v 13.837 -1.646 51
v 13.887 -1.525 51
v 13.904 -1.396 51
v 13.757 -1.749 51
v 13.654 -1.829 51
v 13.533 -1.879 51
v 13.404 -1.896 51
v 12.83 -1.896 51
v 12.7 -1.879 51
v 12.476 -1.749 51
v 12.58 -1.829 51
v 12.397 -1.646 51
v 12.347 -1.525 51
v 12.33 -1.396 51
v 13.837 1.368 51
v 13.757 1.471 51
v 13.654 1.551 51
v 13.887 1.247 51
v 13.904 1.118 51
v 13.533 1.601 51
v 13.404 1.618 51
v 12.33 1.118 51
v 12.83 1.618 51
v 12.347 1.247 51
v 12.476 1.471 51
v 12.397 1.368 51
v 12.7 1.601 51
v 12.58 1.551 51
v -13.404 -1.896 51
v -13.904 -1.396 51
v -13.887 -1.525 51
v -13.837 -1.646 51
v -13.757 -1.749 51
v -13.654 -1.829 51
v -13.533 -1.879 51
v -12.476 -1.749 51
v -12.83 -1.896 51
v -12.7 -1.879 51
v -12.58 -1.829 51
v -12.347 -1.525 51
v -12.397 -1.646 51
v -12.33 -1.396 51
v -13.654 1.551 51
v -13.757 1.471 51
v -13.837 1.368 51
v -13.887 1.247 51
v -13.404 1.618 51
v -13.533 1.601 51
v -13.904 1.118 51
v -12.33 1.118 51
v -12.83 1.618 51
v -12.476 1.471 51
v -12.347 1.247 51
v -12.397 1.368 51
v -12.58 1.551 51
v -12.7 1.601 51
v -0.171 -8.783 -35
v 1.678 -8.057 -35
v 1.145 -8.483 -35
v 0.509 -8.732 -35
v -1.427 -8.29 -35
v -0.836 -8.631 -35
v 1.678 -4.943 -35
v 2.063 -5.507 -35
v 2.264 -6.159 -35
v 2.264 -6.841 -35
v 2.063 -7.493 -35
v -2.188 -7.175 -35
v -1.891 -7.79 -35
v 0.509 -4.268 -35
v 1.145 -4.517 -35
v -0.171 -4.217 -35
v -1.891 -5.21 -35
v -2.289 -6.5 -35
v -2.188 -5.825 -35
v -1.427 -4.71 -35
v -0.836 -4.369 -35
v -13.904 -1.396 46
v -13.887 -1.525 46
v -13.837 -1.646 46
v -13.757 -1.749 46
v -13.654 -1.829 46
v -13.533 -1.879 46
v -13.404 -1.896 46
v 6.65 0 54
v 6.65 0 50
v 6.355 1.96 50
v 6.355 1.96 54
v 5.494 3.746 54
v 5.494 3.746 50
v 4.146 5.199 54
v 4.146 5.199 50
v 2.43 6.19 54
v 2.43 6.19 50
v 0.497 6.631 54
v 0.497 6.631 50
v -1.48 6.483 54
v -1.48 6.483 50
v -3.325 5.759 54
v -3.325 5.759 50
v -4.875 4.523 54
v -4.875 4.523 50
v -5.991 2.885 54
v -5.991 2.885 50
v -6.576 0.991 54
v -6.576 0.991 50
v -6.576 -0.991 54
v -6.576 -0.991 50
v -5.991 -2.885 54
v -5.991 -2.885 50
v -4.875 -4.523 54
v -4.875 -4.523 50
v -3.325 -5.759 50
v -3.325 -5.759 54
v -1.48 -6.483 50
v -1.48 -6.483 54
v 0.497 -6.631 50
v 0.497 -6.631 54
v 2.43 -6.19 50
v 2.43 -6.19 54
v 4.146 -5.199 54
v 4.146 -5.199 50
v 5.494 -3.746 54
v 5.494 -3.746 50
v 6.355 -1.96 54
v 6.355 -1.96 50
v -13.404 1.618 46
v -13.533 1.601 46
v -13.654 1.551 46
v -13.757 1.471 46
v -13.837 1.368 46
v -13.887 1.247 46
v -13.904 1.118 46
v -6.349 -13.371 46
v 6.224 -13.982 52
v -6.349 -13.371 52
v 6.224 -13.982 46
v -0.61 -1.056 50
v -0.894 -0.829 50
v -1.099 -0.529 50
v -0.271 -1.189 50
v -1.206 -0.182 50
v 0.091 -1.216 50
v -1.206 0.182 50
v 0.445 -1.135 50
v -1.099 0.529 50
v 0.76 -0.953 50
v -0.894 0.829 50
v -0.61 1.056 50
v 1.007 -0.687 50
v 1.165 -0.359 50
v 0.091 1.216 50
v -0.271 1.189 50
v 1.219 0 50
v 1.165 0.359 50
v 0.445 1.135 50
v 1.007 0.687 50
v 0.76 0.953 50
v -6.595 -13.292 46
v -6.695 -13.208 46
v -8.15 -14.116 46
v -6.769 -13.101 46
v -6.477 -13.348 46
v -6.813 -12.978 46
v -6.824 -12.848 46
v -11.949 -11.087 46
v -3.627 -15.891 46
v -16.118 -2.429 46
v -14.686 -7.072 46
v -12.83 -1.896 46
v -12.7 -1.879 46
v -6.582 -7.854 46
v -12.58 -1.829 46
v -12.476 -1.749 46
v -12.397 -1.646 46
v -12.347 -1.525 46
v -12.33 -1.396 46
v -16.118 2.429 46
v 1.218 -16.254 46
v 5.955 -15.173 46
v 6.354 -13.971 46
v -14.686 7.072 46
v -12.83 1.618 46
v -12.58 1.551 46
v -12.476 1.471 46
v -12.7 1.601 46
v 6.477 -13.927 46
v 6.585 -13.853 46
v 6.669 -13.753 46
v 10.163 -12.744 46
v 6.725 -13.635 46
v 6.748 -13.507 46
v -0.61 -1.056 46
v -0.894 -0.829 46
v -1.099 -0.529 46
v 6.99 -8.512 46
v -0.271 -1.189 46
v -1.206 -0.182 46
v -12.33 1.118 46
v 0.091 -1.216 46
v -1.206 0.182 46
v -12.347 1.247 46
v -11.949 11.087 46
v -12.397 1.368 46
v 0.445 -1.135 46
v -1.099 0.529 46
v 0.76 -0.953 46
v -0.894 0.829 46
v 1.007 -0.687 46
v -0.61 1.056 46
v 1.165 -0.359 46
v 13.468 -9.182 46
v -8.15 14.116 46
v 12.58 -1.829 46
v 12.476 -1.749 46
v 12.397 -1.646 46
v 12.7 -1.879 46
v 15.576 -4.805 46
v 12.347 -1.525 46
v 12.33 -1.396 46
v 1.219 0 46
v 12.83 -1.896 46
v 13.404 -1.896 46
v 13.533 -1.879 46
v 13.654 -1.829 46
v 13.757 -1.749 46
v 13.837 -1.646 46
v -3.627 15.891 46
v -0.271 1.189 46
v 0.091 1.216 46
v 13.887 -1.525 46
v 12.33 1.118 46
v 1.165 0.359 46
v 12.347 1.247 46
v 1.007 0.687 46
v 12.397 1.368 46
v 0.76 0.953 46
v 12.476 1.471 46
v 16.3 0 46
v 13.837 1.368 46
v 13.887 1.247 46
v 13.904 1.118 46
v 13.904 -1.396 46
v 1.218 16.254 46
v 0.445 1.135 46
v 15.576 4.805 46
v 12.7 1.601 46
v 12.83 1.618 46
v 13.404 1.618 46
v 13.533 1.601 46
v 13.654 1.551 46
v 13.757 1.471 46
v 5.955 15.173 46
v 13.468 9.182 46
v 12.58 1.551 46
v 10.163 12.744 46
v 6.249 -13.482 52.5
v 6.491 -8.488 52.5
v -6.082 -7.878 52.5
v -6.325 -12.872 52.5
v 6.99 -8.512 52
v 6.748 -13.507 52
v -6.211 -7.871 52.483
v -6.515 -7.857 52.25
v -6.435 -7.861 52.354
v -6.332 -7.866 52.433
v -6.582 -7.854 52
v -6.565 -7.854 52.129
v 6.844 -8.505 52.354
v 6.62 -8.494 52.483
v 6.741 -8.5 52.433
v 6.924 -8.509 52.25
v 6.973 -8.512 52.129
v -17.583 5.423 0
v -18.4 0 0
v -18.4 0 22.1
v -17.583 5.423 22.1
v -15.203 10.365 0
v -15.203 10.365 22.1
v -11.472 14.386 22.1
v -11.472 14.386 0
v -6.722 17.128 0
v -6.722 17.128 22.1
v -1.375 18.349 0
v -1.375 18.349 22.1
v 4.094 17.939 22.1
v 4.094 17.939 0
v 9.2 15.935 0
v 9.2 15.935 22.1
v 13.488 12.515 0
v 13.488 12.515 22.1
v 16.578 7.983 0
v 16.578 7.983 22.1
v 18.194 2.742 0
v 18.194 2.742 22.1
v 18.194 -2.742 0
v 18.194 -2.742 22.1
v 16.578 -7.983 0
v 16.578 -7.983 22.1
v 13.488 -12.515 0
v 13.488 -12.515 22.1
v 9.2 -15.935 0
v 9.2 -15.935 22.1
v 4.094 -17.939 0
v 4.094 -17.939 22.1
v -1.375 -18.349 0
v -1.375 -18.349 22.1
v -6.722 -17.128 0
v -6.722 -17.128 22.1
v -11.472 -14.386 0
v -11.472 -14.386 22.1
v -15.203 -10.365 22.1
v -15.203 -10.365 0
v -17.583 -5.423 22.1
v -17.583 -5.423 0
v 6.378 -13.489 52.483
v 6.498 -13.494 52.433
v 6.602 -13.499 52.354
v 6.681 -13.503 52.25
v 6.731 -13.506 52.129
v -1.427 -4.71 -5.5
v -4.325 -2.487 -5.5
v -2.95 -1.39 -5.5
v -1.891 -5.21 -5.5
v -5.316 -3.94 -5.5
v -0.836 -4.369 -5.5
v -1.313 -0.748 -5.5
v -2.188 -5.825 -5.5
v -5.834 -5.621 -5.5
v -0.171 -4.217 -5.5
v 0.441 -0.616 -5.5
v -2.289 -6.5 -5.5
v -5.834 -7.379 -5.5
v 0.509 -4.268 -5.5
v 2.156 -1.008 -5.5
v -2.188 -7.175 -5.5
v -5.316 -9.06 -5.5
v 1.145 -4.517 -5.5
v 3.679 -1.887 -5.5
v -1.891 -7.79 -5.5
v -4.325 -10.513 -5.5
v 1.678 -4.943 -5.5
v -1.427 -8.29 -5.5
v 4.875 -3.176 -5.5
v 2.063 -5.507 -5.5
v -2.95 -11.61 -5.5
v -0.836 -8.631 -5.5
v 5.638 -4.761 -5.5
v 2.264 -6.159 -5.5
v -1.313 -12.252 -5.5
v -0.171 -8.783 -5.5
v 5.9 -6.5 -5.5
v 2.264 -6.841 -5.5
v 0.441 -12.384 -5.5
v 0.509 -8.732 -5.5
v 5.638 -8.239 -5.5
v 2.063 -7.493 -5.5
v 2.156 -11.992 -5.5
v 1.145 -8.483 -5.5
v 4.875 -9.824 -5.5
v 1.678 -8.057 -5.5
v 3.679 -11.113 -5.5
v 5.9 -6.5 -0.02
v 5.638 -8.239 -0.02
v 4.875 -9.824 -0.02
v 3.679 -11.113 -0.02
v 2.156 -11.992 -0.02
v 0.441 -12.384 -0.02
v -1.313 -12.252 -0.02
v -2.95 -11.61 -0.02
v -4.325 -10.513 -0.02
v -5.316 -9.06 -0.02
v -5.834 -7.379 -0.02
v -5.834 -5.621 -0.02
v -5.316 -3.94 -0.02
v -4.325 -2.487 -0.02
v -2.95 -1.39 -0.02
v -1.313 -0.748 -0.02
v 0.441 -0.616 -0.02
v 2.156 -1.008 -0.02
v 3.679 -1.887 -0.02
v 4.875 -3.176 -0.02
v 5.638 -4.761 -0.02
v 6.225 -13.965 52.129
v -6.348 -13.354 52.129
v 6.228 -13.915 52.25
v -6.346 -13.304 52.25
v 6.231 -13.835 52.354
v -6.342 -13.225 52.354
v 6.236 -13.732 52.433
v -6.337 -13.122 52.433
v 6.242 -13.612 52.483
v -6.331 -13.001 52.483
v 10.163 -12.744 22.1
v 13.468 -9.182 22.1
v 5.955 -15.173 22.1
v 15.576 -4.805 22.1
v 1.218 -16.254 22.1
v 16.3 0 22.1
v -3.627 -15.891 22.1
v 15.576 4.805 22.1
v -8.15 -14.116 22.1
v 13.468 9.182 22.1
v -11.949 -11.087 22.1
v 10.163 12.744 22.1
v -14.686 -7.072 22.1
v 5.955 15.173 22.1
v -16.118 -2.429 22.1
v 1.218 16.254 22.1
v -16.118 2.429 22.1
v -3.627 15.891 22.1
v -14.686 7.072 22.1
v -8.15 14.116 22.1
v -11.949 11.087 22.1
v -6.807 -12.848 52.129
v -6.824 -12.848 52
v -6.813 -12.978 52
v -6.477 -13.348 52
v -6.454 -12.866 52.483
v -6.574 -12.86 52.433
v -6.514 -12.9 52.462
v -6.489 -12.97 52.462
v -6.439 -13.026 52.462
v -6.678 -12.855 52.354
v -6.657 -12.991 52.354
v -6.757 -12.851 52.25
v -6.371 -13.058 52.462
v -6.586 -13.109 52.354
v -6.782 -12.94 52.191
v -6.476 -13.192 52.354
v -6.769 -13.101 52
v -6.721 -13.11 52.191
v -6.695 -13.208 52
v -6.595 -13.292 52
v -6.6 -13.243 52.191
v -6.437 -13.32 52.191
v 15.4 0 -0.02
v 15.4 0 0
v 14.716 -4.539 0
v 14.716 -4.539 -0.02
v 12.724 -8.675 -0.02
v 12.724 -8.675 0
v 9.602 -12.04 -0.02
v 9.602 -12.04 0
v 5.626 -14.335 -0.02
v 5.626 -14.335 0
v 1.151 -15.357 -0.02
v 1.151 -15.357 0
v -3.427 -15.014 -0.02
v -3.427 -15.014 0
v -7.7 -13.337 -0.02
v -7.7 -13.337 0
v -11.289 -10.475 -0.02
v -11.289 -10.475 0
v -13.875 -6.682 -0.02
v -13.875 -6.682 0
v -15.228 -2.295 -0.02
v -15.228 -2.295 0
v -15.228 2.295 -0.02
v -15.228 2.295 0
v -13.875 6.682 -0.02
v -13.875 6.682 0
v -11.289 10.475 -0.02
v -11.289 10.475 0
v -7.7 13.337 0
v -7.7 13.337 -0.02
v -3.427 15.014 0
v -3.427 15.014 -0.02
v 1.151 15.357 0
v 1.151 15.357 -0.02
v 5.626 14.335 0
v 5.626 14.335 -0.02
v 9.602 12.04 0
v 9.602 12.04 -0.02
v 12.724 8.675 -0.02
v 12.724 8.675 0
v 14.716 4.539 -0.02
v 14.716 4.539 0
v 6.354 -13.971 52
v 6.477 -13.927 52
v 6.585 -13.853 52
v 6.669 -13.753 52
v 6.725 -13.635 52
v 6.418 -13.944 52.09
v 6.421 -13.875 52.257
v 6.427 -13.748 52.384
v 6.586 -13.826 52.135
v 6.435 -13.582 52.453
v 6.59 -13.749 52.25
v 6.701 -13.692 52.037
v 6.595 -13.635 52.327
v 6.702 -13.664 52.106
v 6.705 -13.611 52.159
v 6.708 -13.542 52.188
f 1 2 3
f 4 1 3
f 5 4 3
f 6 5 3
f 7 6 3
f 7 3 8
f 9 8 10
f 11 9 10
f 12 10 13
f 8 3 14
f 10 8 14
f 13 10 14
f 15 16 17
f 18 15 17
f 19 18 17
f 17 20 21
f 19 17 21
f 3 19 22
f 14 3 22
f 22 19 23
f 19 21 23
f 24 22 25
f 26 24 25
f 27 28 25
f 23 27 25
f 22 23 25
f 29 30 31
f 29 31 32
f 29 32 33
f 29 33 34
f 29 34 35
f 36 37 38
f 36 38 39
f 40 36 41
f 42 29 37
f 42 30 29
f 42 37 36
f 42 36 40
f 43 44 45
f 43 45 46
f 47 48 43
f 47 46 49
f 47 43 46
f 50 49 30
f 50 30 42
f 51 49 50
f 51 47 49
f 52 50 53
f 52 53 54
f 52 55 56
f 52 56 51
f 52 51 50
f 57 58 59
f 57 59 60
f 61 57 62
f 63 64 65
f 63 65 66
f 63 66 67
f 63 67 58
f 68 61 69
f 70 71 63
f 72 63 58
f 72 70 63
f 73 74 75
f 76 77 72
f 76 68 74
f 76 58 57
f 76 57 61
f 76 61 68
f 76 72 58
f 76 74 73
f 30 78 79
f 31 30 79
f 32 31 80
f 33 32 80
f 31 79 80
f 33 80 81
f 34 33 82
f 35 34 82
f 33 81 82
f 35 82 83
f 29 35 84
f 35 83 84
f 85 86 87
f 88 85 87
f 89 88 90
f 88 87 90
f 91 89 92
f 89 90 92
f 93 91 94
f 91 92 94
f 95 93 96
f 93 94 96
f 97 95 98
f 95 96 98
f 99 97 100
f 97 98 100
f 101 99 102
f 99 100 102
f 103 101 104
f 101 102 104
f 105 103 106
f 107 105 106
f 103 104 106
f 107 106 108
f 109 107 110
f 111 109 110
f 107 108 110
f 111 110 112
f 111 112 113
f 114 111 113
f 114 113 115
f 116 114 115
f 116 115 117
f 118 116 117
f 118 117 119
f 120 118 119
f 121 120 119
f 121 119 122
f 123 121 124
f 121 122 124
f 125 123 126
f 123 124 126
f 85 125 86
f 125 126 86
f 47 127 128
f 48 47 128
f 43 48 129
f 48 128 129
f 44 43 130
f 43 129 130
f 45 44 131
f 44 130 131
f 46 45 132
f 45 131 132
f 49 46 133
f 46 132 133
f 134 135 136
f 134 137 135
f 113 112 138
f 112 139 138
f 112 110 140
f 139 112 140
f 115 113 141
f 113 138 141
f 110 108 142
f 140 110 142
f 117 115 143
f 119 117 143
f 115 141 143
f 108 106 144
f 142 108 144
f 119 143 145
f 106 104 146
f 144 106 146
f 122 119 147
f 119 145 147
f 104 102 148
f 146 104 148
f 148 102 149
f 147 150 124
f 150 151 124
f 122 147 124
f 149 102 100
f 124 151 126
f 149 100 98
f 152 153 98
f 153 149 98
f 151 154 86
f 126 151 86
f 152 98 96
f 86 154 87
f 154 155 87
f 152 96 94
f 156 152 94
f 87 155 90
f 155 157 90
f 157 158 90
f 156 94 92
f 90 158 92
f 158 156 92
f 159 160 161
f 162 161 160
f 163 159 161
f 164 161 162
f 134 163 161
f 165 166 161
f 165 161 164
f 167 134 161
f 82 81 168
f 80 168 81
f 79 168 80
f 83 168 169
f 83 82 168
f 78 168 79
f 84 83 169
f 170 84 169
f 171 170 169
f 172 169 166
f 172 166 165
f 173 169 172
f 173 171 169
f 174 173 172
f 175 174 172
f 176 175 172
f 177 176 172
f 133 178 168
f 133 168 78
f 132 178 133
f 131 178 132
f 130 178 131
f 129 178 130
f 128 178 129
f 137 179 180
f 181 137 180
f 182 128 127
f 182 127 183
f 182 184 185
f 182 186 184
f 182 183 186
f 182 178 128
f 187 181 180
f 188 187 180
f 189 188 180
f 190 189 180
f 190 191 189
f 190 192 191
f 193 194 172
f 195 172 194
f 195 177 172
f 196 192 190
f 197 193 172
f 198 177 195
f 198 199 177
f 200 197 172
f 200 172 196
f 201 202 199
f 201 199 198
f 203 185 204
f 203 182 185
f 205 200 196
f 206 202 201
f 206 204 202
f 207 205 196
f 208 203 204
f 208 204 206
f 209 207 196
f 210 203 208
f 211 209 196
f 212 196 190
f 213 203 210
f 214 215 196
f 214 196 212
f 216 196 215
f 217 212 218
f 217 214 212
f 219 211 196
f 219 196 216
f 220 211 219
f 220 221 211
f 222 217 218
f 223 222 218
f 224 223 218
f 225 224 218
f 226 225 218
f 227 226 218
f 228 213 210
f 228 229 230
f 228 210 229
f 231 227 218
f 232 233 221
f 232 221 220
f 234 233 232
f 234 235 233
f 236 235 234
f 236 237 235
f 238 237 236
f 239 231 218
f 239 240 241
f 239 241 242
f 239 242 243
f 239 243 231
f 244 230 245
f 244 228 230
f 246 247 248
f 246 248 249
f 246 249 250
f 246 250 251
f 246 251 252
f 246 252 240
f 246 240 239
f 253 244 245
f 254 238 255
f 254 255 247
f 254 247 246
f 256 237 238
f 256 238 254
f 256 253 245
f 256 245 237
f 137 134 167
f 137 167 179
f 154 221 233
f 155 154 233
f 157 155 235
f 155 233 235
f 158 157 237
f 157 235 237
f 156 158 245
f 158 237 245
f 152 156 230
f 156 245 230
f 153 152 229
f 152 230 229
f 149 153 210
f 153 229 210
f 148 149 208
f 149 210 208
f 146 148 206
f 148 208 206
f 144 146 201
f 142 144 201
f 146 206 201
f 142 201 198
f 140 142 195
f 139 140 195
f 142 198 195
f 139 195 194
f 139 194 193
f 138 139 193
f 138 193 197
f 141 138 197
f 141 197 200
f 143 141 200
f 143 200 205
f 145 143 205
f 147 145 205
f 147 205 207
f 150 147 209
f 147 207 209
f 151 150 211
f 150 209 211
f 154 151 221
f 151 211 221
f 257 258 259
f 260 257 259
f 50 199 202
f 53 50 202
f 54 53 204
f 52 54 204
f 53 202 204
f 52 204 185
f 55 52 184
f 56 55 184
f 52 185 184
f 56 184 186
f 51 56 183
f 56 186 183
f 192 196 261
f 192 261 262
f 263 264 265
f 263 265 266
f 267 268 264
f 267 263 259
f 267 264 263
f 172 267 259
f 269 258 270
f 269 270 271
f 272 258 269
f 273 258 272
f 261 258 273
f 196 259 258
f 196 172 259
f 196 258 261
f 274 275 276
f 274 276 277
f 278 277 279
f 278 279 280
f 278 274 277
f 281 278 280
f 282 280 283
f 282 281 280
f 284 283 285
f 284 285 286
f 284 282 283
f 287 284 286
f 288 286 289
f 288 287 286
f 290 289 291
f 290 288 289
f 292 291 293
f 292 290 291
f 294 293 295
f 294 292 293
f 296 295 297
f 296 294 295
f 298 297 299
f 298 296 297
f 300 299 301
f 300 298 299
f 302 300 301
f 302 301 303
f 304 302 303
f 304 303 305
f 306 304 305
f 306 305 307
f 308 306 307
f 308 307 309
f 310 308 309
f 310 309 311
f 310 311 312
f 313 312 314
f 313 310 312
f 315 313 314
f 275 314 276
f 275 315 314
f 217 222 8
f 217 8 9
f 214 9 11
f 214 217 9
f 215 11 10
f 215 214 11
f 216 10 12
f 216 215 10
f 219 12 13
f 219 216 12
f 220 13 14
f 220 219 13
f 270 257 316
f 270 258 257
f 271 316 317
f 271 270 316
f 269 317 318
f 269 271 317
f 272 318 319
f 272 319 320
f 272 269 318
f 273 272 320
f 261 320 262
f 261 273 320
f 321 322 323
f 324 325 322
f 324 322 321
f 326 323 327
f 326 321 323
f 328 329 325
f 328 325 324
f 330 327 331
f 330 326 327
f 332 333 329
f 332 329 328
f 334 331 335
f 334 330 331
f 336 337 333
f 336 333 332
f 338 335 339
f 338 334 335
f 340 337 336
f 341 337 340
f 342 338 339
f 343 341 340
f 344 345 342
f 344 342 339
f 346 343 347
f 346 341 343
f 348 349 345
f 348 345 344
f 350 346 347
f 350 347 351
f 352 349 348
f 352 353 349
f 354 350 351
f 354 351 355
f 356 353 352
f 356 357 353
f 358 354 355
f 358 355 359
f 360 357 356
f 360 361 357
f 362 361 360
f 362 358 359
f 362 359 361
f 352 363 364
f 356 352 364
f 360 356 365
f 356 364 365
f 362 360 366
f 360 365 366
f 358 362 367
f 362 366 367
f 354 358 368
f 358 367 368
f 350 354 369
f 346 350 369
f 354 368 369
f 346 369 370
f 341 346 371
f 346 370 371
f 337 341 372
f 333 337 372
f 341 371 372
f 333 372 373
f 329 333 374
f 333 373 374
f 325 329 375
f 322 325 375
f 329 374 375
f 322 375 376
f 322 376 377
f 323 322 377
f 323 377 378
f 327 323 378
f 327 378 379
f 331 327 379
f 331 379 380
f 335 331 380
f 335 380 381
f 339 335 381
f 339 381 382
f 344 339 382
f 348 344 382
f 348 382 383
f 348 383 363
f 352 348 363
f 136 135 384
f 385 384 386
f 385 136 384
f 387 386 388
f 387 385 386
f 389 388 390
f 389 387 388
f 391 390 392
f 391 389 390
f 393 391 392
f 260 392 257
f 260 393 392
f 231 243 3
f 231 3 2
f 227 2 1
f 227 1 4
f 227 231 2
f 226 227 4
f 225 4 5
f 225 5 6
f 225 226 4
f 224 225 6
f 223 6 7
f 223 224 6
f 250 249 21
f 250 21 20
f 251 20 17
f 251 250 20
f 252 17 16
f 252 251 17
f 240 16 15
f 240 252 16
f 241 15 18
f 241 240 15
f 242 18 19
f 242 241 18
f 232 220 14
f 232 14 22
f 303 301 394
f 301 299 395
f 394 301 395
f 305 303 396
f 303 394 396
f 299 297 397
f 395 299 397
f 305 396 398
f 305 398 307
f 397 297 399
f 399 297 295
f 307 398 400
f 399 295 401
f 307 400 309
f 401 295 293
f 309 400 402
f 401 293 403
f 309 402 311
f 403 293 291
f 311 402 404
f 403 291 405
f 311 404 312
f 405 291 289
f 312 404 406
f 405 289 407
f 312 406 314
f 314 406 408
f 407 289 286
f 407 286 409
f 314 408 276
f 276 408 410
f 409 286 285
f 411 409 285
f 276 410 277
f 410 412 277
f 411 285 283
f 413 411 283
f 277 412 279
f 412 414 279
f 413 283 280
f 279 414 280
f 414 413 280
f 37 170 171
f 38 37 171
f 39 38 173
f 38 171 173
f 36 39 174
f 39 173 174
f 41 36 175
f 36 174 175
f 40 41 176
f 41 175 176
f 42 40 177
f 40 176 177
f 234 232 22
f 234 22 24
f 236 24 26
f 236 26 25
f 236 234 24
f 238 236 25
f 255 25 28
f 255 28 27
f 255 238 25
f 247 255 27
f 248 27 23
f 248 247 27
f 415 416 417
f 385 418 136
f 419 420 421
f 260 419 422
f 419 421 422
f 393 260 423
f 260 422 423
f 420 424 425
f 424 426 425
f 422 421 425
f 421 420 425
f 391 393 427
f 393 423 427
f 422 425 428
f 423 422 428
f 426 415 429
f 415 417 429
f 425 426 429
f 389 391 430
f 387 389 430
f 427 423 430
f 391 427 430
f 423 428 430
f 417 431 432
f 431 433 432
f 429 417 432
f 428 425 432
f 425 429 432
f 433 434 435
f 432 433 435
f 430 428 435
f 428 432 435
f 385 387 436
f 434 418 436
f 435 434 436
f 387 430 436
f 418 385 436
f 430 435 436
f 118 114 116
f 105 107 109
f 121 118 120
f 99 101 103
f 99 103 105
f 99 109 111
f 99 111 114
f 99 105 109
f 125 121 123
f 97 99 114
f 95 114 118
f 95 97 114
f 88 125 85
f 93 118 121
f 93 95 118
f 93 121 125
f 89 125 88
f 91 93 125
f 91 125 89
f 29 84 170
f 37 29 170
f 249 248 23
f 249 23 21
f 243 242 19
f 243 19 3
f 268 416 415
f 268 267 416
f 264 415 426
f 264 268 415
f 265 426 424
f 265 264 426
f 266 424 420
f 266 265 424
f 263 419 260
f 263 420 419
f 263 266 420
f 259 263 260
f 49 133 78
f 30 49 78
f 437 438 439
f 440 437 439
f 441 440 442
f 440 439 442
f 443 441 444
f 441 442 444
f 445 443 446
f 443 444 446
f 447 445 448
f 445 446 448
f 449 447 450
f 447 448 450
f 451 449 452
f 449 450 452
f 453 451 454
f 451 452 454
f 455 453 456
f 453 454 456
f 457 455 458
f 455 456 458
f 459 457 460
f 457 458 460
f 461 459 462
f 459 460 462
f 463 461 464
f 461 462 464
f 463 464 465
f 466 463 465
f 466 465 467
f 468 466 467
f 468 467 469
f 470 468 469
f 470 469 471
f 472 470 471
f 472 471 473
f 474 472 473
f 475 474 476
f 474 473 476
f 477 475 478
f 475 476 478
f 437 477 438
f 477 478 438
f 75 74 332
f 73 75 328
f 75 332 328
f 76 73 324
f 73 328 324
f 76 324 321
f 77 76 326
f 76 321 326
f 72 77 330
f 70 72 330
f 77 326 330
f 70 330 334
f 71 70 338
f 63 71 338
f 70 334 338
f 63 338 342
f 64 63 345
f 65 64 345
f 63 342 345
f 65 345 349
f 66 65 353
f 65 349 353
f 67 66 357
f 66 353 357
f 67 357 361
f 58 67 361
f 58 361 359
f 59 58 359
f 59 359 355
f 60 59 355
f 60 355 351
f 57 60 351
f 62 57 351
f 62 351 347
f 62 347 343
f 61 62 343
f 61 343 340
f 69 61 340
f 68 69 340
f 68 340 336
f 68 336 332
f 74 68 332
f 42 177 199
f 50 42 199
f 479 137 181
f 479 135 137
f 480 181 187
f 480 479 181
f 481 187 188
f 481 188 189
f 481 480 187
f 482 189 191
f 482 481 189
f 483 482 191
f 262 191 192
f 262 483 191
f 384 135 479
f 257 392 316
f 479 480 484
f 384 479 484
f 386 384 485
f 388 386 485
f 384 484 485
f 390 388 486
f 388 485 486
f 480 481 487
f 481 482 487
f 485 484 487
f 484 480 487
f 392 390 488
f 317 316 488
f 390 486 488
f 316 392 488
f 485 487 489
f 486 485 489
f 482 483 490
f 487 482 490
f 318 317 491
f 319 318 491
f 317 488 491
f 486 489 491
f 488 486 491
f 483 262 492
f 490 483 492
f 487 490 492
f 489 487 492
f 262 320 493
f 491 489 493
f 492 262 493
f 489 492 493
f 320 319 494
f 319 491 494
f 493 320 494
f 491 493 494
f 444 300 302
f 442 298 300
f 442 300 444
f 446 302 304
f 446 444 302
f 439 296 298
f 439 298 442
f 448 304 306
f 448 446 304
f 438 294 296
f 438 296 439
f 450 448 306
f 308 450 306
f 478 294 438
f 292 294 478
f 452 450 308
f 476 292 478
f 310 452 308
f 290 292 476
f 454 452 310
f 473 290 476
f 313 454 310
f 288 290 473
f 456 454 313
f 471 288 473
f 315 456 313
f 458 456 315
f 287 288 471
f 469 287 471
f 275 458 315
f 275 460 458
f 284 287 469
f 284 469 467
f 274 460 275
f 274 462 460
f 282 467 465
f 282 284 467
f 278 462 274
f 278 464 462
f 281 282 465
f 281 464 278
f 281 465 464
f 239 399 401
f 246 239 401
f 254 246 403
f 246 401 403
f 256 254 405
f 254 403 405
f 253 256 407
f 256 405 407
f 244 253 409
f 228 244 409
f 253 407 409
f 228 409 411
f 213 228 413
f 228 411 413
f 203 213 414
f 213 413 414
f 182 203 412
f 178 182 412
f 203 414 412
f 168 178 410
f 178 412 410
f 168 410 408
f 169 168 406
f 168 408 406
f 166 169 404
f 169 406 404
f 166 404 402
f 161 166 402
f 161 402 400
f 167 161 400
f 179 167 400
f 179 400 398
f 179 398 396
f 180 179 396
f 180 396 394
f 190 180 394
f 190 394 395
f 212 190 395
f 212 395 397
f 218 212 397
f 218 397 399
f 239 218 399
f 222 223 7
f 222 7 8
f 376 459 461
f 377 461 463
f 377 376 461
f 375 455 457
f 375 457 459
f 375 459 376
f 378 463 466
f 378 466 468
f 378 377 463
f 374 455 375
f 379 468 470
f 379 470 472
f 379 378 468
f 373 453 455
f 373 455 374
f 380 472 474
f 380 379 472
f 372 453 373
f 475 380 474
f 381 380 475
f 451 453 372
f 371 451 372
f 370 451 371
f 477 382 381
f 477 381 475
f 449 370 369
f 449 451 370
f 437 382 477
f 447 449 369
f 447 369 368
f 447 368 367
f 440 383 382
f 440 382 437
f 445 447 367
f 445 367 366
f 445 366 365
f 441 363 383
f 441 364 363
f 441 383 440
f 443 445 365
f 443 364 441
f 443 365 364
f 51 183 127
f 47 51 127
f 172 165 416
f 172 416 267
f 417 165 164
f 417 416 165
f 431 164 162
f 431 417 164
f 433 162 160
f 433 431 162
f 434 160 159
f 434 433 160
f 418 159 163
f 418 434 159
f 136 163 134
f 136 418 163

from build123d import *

# Parameters (mm, degrees)
SKETCH1_R            = 16.3
BOSS_EXTRUDE1_DEPTH  = 46
SKETCH2_R            = 18.4
BOSS_EXTRUDE2_DEPTH  = 22.1
SKETCH3_R            = 5.9
SKETCH3_R_2          = 2.289263955330087
BOSS_EXTRUDE3_DEPTH  = 5.5
SKETCH4_R            = 2.289263955330087
BOSS_EXTRUDE4_DEPTH  = 35
SKETCH5_R            = 15.4
BOSS_EXTRUDE5_DEPTH  = 0.02
SKETCH7_R            = 1.219257325052135
BOSS_EXTRUDE6_DEPTH  = 4
SKETCH8_R            = 6.650000000000001
BOSS_EXTRUDE7_DEPTH  = 4
BOSS_EXTRUDE9_DEPTH  = 6.5
FILLET3_R            = 0.5
FILLET4_R            = 0.5
BOSS_EXTRUDE10_DEPTH = 5


with BuildPart() as part:
    # Sketch1 → Boss-Extrude1 (new body)
    with BuildSketch(Plane.XY):
        Circle(SKETCH1_R)
    extrude(amount=BOSS_EXTRUDE1_DEPTH)

    # Sketch2 → Boss-Extrude2 (add)
    with BuildSketch(Plane(origin=(0, 0, 0), x_dir=(-1, 0, 0), z_dir=(0, 0, -1))):
        Circle(SKETCH2_R)
    extrude(amount=-BOSS_EXTRUDE2_DEPTH)

    # Sketch3 → Boss-Extrude3 (add)
    with BuildSketch(Plane(origin=(0, 0, 0), x_dir=(-1, 0, 0), z_dir=(0, 0, -1))):
        with Locations(Location((3.05e-15, -6.499999999999999, 0), (0, 0, 180))):
            Circle(SKETCH3_R)
        with Locations((3.05e-15, -6.499999999999999)):
            Circle(SKETCH3_R_2, mode=Mode.SUBTRACT)
    extrude(amount=BOSS_EXTRUDE3_DEPTH)

    # Sketch4 → Boss-Extrude4 (add)
    with BuildSketch(Plane(origin=(0, 0, 0), x_dir=(-1, 0, 0), z_dir=(0, 0, -1))):
        with Locations((3.05e-15, -6.499999999999999)):
            Circle(SKETCH4_R)
    extrude(amount=BOSS_EXTRUDE4_DEPTH)

    # Sketch5 → Boss-Extrude5 (add)
    with BuildSketch(Plane(origin=(0, 0, 0), x_dir=(-1, 0, 0), z_dir=(0, 0, -1))):
        with Locations(Location((0, 0, 0), (0, 0, 180))):
            Circle(SKETCH5_R)
    extrude(amount=BOSS_EXTRUDE5_DEPTH)

    # Sketch7 → Boss-Extrude6 (add)
    with BuildSketch(Plane.XY.offset(46)):
        Circle(SKETCH7_R)
    extrude(amount=BOSS_EXTRUDE6_DEPTH)

    # Sketch8 → Boss-Extrude7 (add)
    with BuildSketch(Plane.XY.offset(50)):
        Circle(SKETCH8_R)
    extrude(amount=BOSS_EXTRUDE7_DEPTH)

    # Sketch9 → Boss-Extrude9 (add)
    with BuildSketch(Plane.XY.offset(46)):
        Polygon((6.723733828483781, -14.005985299746056), (-6.848294391516219, -13.347034241416539), (-6.581571792597097, -7.853505406939939), (6.990456427402904, -8.512456465269457), align=None)
    extrude(amount=BOSS_EXTRUDE9_DEPTH)

    # Fillet3
    fillet3_edges = [part.edges().sort_by_distance(p)[0] for p in [
        (-6.848294391516219, -13.347034241416539, 49.25),
        (-6.714933092056658, -10.60026982417824, 52.5),
        (-0.06228028151621867, -13.676509770581298, 52.5),
    ]]
    fillet(fillet3_edges, radius=FILLET3_R)

    # Fillet4
    fillet4_edges = [part.edges().sort_by_distance(p)[0] for p in [
        (6.723733828483781, -14.005985299746056, 49),
        (6.869218882439666, -11.009515026395185, 52.5),
        (6.730835759440846, -13.859710995839299, 52.35355339059328),
    ]]
    fillet(fillet4_edges, radius=FILLET4_R)

    # Sketch10 → Boss-Extrude10 (add)
    with BuildSketch(Plane.XY.offset(46)):
        with BuildLine():
            Line((-13.903663432832225, 1.1177381723245752), (-13.903663432832225, -1.3957121223426263))
            ThreePointArc((-13.903663432832225, -1.3957121223426263), (-13.757216823425498, -1.7492655129359036), (-13.403663432832222, -1.8957121223426299))
            Line((-13.403663432832222, -1.8957121223426299), (-12.829664566070878, -1.8957121223426299))
            ThreePointArc((-12.829664566070878, -1.8957121223426299), (-12.476111175477602, -1.7492655129359036), (-12.329664566070875, -1.3957121223426263))
            Line((-12.329664566070875, -1.3957121223426263), (-12.329664566070875, 1.1177381723245752))
            ThreePointArc((-12.329664566070875, 1.1177381723245752), (-12.476111175477602, 1.4712915629178525), (-12.829664566070878, 1.6177381723245787))
            Line((-12.829664566070878, 1.6177381723245787), (-13.403663432832222, 1.6177381723245787))
            ThreePointArc((-13.403663432832222, 1.6177381723245787), (-13.757216823425498, 1.4712915629178525), (-13.903663432832225, 1.1177381723245752))
        make_face()
        with BuildLine():
            Line((13.403663432832222, -1.8957121223426299), (12.829664566070878, -1.8957121223426299))
            ThreePointArc((12.829664566070878, -1.8957121223426299), (12.476111175477602, -1.7492655129359036), (12.329664566070875, -1.3957121223426263))
            Line((12.329664566070875, -1.3957121223426263), (12.329664566070875, 1.1177381723245752))
            ThreePointArc((12.329664566070875, 1.1177381723245752), (12.476111175477602, 1.4712915629178525), (12.829664566070878, 1.6177381723245787))
            Line((12.829664566070878, 1.6177381723245787), (13.403663432832222, 1.6177381723245787))
            ThreePointArc((13.403663432832222, 1.6177381723245787), (13.757216823425498, 1.4712915629178525), (13.903663432832225, 1.1177381723245752))
            Line((13.903663432832225, 1.1177381723245752), (13.903663432832225, -1.3957121223426263))
            ThreePointArc((13.903663432832225, -1.3957121223426263), (13.757216823425498, -1.7492655129359036), (13.403663432832222, -1.8957121223426299))
        make_face()
    extrude(amount=BOSS_EXTRUDE10_DEPTH)


solid = part.part
